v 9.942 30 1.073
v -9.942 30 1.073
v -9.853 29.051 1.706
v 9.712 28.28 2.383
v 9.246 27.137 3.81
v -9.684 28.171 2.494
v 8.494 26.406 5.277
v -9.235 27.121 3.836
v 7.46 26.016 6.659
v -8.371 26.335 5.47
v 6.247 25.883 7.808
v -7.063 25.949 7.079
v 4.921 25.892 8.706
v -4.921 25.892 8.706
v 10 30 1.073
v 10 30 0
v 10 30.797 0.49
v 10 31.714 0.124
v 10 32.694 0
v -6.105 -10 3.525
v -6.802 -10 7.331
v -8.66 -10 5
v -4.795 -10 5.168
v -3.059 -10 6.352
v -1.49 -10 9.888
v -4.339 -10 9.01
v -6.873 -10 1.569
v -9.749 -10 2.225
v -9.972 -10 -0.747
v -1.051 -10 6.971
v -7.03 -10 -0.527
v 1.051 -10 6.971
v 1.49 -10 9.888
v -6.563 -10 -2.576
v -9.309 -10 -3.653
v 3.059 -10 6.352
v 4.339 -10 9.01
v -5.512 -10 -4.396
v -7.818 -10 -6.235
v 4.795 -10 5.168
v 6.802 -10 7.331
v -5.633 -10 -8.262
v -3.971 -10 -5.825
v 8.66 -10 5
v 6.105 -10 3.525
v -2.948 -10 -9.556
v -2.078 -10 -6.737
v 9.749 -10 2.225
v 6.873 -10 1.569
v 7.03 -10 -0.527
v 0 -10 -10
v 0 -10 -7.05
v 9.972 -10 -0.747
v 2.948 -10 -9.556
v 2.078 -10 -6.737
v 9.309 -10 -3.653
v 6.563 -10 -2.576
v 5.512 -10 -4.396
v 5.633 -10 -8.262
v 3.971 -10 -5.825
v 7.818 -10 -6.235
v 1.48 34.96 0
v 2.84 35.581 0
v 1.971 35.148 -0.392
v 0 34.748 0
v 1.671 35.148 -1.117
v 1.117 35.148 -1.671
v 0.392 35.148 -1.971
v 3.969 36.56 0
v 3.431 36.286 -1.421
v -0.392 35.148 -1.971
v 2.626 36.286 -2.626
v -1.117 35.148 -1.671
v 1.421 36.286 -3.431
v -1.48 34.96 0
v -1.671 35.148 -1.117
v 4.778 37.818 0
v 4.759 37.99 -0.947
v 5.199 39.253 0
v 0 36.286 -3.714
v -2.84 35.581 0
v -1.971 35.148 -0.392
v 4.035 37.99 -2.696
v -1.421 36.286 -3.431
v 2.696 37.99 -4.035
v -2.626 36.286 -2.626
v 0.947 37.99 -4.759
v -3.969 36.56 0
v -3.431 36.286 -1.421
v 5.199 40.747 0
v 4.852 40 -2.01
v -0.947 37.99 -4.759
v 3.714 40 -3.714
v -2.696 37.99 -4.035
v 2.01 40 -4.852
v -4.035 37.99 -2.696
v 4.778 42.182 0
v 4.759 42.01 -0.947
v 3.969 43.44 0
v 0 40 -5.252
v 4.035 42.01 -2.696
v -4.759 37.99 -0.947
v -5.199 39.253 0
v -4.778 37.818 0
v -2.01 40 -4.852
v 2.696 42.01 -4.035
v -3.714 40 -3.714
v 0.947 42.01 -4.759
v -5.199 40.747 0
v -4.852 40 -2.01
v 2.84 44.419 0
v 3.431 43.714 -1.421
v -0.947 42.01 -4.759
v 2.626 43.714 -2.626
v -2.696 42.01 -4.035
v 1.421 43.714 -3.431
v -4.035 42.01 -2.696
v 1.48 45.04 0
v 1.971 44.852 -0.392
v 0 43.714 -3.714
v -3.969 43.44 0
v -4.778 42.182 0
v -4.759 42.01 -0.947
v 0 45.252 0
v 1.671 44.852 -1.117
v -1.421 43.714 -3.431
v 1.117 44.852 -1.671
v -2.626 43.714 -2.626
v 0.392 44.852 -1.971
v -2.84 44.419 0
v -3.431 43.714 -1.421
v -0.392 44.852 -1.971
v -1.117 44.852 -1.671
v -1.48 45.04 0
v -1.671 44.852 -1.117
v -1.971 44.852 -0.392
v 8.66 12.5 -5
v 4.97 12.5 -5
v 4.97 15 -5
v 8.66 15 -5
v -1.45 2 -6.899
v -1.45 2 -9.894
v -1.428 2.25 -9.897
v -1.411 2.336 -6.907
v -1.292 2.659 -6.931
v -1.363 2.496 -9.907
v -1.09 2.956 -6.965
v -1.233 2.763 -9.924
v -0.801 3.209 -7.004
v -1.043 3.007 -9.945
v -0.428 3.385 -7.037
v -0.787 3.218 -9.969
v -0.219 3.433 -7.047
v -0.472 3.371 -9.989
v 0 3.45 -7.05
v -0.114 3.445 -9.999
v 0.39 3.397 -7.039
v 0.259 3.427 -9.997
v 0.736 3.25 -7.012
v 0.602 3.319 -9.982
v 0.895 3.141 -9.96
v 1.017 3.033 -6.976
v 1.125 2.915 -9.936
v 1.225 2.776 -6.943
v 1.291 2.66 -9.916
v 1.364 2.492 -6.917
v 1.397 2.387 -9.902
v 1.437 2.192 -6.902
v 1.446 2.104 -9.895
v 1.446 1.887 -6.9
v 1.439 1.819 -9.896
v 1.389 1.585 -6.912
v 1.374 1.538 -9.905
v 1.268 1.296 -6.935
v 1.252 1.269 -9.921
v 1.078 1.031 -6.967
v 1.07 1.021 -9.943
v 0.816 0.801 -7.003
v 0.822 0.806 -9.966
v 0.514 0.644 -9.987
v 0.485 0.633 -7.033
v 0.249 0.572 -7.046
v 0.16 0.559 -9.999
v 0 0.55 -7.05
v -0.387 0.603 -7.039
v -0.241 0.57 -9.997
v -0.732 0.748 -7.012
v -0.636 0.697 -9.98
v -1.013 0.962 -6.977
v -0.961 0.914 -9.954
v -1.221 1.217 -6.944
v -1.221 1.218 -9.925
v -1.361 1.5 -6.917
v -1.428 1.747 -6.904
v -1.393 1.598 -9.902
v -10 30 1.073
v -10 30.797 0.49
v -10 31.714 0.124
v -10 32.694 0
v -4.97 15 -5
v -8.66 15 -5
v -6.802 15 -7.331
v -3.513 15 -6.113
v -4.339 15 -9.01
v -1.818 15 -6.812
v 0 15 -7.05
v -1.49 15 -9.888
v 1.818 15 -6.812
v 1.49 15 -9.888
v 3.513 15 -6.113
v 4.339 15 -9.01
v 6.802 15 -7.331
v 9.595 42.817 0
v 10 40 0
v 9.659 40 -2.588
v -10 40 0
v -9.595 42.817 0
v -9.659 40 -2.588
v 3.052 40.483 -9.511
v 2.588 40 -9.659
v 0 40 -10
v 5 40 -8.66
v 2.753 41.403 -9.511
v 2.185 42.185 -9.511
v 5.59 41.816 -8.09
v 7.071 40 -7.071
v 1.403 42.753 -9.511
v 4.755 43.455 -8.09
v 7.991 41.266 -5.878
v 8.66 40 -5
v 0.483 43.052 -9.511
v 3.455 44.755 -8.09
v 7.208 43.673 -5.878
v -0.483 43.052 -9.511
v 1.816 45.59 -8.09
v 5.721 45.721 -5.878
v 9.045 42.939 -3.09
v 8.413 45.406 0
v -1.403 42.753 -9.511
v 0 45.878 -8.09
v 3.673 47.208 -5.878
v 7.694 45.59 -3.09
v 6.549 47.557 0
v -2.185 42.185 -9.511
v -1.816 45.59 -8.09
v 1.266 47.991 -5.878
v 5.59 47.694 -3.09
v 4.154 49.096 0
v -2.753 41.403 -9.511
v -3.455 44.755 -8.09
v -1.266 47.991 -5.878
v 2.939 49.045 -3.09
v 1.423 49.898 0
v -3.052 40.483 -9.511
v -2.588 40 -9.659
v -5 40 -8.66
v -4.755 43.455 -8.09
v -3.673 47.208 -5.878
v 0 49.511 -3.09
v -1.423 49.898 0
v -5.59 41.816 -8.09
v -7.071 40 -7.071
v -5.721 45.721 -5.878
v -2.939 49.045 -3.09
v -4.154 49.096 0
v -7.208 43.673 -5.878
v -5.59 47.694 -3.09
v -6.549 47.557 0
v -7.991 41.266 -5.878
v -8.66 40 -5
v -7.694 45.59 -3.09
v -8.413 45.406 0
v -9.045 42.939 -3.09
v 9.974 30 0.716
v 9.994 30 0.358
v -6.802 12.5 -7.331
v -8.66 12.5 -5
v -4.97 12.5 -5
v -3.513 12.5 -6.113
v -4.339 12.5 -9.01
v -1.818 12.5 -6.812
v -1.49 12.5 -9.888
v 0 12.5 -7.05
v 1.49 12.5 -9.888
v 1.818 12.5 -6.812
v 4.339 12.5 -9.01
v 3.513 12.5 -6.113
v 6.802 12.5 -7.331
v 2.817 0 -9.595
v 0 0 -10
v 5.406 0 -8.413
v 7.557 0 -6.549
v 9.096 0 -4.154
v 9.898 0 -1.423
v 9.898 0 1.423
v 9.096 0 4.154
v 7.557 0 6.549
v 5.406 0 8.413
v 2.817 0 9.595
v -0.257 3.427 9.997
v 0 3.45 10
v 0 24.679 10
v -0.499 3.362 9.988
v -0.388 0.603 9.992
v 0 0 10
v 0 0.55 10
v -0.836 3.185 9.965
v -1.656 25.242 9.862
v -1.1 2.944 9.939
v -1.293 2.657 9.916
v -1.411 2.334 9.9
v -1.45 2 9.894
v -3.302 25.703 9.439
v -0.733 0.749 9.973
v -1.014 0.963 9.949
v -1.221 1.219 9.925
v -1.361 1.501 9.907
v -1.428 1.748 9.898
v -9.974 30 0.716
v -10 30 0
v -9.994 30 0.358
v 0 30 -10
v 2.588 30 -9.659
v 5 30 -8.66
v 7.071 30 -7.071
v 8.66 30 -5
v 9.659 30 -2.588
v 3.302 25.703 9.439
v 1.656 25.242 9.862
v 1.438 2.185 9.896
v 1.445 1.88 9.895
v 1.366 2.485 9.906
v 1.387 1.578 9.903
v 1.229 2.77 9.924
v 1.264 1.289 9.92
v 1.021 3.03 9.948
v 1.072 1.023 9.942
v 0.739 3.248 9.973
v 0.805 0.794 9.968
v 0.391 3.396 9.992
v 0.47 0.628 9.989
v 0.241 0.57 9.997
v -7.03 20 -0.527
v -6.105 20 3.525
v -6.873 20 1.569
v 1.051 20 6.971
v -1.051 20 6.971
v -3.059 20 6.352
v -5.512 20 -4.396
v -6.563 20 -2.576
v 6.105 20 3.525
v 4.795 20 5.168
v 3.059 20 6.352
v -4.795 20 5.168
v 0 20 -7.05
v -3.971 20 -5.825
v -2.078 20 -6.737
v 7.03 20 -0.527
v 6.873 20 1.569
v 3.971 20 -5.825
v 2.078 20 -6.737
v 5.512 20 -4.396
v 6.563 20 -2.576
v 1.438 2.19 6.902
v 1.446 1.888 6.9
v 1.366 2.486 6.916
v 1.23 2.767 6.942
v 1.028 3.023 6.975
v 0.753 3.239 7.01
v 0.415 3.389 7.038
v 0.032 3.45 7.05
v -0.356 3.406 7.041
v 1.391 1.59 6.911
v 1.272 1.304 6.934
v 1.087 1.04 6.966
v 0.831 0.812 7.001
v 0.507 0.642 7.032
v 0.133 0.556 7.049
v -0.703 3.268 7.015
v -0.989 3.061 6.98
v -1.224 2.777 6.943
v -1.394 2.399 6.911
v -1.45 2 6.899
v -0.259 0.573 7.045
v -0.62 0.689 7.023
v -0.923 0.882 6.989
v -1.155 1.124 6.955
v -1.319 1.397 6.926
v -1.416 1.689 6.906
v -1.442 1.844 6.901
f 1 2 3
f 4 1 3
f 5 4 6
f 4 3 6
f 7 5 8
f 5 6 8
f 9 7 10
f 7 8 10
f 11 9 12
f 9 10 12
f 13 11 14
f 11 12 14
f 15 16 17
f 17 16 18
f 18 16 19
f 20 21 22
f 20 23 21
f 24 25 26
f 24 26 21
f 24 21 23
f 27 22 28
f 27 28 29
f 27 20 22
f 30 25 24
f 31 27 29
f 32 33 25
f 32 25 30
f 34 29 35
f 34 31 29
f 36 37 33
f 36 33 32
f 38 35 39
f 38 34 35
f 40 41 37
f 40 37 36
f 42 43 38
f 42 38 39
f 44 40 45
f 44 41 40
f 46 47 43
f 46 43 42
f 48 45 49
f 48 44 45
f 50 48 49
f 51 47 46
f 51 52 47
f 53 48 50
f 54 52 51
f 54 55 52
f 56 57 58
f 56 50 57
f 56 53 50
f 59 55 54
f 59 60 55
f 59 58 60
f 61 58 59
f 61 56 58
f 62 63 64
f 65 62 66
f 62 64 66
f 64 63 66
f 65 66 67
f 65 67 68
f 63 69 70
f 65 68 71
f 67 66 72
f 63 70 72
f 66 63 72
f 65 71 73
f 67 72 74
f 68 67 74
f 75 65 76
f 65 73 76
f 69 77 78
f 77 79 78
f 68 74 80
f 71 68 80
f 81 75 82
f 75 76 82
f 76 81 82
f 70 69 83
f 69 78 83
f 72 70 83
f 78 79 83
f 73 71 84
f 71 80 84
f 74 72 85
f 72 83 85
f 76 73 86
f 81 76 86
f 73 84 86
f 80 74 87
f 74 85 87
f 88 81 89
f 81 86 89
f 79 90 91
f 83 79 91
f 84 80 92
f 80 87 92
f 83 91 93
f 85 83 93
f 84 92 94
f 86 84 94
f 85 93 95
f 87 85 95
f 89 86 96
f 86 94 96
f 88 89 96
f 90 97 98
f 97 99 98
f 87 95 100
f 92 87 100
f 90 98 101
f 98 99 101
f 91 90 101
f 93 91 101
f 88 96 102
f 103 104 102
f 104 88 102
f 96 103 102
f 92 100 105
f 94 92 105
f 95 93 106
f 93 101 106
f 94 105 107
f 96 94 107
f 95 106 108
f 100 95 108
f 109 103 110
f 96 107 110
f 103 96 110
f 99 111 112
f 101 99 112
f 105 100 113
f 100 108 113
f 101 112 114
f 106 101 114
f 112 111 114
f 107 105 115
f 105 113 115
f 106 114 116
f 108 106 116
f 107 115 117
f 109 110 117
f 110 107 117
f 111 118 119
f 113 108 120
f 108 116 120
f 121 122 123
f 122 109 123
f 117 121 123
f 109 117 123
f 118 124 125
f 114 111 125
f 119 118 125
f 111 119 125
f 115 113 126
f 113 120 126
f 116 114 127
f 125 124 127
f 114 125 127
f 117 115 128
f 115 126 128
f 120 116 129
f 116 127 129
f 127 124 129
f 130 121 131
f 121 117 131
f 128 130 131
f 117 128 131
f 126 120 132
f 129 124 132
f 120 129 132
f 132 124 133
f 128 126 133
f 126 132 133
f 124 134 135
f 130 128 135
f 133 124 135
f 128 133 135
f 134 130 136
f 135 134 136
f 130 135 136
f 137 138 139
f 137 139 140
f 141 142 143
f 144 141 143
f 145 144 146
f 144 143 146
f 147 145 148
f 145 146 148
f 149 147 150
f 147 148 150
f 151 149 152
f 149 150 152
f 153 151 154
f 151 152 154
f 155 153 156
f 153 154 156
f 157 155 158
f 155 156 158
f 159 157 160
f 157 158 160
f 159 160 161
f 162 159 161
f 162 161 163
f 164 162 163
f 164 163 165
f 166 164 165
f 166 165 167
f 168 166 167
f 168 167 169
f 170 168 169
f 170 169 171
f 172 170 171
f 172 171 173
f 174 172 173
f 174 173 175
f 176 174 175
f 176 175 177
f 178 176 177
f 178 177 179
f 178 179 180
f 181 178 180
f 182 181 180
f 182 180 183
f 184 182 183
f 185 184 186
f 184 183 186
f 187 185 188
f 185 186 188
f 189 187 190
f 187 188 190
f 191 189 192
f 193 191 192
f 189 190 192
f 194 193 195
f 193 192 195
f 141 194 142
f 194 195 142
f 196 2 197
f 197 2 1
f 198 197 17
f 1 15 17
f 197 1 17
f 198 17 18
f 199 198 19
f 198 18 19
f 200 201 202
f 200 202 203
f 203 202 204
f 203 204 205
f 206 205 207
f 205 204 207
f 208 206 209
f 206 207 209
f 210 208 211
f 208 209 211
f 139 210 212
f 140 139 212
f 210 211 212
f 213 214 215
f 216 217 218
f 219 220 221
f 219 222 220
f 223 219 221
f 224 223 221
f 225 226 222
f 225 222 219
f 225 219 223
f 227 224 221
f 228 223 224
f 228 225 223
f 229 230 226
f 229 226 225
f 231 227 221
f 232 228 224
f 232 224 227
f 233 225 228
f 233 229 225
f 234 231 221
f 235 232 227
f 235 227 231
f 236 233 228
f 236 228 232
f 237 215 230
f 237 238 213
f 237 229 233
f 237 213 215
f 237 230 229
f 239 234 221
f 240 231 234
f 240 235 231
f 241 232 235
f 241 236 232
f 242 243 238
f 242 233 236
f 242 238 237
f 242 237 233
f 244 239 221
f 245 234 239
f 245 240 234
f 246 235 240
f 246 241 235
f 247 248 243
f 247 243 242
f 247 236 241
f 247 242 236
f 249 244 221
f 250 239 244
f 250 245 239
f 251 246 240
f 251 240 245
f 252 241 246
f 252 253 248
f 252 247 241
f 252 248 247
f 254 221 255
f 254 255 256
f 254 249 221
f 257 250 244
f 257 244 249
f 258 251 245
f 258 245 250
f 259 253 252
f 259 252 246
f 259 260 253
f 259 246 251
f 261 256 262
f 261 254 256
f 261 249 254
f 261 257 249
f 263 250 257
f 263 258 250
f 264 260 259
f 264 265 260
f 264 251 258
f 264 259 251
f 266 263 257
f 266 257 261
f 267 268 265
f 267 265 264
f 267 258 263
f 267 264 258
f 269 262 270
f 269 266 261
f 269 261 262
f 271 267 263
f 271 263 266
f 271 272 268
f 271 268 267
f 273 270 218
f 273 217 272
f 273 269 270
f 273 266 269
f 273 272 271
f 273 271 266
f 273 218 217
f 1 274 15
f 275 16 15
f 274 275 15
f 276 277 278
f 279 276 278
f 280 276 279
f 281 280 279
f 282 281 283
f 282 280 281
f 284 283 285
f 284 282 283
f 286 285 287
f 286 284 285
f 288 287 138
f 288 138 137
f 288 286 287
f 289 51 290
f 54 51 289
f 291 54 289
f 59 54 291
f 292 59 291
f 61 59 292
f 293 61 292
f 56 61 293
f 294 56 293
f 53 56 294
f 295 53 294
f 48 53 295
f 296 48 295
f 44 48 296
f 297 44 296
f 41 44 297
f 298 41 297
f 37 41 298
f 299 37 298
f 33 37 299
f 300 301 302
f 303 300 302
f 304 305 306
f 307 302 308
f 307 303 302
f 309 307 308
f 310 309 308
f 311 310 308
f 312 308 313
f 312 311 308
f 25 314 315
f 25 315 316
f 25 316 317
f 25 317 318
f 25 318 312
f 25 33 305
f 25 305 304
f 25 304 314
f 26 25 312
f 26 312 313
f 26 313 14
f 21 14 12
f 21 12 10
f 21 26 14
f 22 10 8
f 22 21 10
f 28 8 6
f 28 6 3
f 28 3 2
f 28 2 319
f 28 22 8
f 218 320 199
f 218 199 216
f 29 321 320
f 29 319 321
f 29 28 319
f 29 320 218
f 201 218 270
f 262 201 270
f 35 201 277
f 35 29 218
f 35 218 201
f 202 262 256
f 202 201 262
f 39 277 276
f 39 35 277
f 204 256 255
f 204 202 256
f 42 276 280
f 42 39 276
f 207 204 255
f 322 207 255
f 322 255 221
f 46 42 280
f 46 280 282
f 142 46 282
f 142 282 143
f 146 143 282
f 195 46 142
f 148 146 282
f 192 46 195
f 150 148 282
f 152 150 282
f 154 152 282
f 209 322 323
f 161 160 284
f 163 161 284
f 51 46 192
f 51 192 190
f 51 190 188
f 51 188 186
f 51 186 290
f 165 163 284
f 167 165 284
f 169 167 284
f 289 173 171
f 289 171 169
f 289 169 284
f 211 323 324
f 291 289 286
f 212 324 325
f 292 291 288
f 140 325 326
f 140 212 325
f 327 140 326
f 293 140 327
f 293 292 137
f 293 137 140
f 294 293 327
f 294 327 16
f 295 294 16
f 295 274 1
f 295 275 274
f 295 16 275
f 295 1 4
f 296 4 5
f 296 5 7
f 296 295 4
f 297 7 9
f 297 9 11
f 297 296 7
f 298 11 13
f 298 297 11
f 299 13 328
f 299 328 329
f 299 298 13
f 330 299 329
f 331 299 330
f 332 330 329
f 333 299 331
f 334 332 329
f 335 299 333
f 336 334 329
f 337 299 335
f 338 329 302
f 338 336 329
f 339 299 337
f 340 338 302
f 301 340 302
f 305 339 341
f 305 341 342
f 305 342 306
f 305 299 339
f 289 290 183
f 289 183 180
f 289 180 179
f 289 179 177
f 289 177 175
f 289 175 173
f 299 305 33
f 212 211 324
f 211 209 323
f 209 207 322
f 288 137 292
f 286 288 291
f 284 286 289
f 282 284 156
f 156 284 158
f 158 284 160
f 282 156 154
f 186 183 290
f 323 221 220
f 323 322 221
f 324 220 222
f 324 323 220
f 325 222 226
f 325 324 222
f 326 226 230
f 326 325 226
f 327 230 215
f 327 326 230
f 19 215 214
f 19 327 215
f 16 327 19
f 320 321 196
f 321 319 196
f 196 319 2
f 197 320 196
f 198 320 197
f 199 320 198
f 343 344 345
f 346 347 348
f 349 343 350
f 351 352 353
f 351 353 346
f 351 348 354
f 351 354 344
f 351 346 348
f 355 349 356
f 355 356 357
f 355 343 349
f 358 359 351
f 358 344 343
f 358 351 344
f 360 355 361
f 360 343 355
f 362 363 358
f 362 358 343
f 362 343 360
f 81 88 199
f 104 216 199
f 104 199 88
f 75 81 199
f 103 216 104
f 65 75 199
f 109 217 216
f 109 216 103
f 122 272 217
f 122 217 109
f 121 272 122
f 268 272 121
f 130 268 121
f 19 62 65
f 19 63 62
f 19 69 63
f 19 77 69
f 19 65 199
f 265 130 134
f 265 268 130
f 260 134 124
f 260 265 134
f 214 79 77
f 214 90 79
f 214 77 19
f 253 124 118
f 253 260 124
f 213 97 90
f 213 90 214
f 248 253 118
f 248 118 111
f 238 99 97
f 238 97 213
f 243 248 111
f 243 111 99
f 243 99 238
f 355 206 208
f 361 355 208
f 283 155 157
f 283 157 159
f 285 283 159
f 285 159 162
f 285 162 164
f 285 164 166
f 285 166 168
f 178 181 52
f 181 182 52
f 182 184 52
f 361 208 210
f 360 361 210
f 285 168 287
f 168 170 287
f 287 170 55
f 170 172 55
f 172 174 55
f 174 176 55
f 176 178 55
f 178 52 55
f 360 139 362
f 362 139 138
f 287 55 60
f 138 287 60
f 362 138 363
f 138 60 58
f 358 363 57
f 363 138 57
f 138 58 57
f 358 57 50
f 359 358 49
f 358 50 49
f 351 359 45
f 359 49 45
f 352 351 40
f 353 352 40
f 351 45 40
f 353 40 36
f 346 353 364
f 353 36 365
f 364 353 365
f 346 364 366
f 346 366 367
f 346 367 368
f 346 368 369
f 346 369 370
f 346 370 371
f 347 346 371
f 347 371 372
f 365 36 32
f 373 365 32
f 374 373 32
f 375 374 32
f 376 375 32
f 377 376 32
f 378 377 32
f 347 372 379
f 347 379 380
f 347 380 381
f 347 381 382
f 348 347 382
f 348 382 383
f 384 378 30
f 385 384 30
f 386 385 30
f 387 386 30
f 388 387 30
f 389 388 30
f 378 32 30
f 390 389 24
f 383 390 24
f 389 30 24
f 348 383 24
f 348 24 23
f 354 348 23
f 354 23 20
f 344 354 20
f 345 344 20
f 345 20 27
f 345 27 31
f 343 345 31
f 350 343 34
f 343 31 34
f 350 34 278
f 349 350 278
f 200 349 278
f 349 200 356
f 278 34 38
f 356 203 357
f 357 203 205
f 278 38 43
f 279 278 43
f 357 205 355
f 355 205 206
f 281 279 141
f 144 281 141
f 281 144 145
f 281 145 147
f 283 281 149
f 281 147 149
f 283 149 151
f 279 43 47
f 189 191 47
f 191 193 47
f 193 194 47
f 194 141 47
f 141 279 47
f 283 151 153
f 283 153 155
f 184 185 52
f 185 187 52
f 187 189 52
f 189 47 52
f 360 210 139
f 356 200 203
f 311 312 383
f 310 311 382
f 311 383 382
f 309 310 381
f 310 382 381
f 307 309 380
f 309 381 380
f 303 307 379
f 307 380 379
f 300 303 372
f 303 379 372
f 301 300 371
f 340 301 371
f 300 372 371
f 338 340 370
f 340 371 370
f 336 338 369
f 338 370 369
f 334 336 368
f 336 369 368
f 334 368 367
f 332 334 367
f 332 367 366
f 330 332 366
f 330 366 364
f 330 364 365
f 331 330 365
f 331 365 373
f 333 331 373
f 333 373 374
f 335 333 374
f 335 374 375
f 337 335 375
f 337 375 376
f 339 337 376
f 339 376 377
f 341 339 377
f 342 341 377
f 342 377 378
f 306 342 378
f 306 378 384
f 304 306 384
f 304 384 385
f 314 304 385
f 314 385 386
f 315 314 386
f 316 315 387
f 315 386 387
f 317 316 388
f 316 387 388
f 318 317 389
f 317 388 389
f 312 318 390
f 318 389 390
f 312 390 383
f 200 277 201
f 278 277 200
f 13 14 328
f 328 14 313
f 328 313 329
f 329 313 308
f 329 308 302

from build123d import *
from build123d.topology import SkipClean

# Parameters (mm, degrees)
SKETCH_1_R               = 10
EXTRUDE_1_DEPTH          = 30
SKETCH_2_R               = 7.05
CUT_EXTRUDE_1_DEPTH      = 20
REVOLVE_10_ANGLE         = 180
CUT_EXTRUDE_2_DEPTH      = 52.961524228
CUT_EXTRUDE_2_DEPTH_BACK = 52.961524228
EXTRUDE_2_DEPTH          = 10
CUT_EXTRUDE_START        = -2.5
CUT_EXTRUDE_3_DEPTH      = 2.5
EXTRUDE_START            = 10
SKETCH_11_R              = 10
SKETCH_11_R_2            = 7.05
EXTRUDE_3_DEPTH          = 10
HOLE_WIZARD_M2_5_1_D     = 2.9


# Read off the part's stored shape, not the designer's step: 회전1
with BuildPart() as part:
    # 스케치1 → 보스-돌출1 (new body)
    with BuildSketch(Plane(origin=(0, 0, 0), x_dir=(1, 0, 0), z_dir=(0, 1, 0))):
        with Locations(Location((0, 0, 0), (0, 0, 270))):
            Circle(SKETCH_1_R)
    extrude(amount=EXTRUDE_1_DEPTH)

    # 스케치2 → 컷-돌출1 (cut)
    with BuildSketch(Plane.XZ):
        with Locations(Location((0, 0, 0), (0, 0, 270))):
            Circle(SKETCH_2_R)
    extrude(amount=-CUT_EXTRUDE_1_DEPTH, mode=Mode.SUBTRACT)



with BuildPart() as body_2:
    # 회전1 outline → 회전1 (revolve)
    with BuildSketch(Plane.XZ.offset(-40)):
        with BuildLine():
            Line((0, 1e-08), (0, -10))
            ThreePointArc((0, -10), (7.071067815, -7.071067808), (10, 1e-08))
            Line((10, 1e-08), (0, 1e-08))
        make_face()
    revolve(axis=Axis((0, 40, 0), (0, 0, 1)))

    # 스케치5 → 컷-회전3 (revolve, cut)
    with BuildSketch(Plane.XY):
        with BuildLine():
            Line((0, 45.252296995), (0, 34.747703005))
            ThreePointArc((0, 34.747703005), (5.252296995, 40), (0, 45.252296995))
        make_face()
    revolve(axis=Axis((0, 0, 0), (0, 1, 0)), mode=Mode.SUBTRACT)


with BuildPart() as part_1:
    with SkipClean():  # the faces are left unmerged after this step: merging them gives an invalid solid
        add(part.part)

        add(body_2.part)  # 회전10 merges body 2
        # 스케치6 → 회전10 (revolve, symmetric)
        with BuildSketch(Plane(origin=(0, 0, 0), x_dir=(0, 0, -1), z_dir=(1, 0, 0))) as revolve_10_sk:
            with BuildLine():
                Line((0, 30), (0, 30.711529751))
                ThreePointArc((0, 30.711529751), (5.980054101, 33.531969517), (7.351370698, 40))
                Line((7.351370698, 40), (10, 40))
                Line((10, 40), (10, 30))
                Line((10, 30), (0, 30))
            make_face()
        revolve(axis=Axis((0, 0, 0), (0, 1, 0)), revolution_arc=REVOLVE_10_ANGLE / 2)
        revolve(revolve_10_sk.sketch, axis=Axis((0, 0, 0), (0, -1, 0)), revolution_arc=REVOLVE_10_ANGLE / 2)
    add(part_1.part.scale(1), mode=Mode.REPLACE)  # the faces are merged on a copy

    # 스케치7 → 컷-돌출2 (cut, two sides: drawn at the far end of the back side and taken through both)
    with BuildSketch(Plane(origin=(0, 0, 0), x_dir=(0, 0, -1), z_dir=(1, 0, 0)).offset(-CUT_EXTRUDE_2_DEPTH_BACK)):
        with BuildLine():
            Line((-10, 24.679295292), (-17.050906842, 49.125599249))
            Line((-17.050906842, 49.125599249), (0, 49.125599249))
            Line((0, 49.125599249), (0, 34.049122638))
            ThreePointArc((0, 34.049122638), (-2.58520571, 28.084119755), (-8.705629602, 25.892098007))
            ThreePointArc((-8.705629602, 25.892098007), (-9.615626451, 25.566183836), (-10, 24.679295292))
        make_face()
    extrude(amount=CUT_EXTRUDE_2_DEPTH + CUT_EXTRUDE_2_DEPTH_BACK, mode=Mode.SUBTRACT)

    # 스케치8 → 보스-돌출2 (add, symmetric)
    with BuildSketch(Plane(origin=(0, 0, 0), x_dir=(0, 0, -1), z_dir=(1, 0, 0))):
        with BuildLine():
            Line((0, 32.693889078), (0, 30))
            Line((0, 30), (-1.073327621, 30))
            ThreePointArc((-1.073327621, 30), (-0.278211386, 31.243969205), (0, 32.693889078))
        make_face()
    extrude(amount=EXTRUDE_2_DEPTH, both=True)

    # 스케치10 → 컷-돌출3 (cut)
    with BuildSketch(Plane(origin=(0, 15, 0), x_dir=(1, 0, 0), z_dir=(0, 1, 0)).offset(CUT_EXTRUDE_START)):
        with BuildLine():
            Line((-8.660254038, 5), (-3.31662479, 5))
            ThreePointArc((-3.31662479, 5), (0, 6), (3.31662479, 5))
            Line((3.31662479, 5), (8.660254038, 5))
            ThreePointArc((8.660254038, 5), (0, 10), (-8.660254038, 5))
        make_face()
    extrude(amount=CUT_EXTRUDE_3_DEPTH, mode=Mode.SUBTRACT)

    # 스케치11 → 보스-돌출3 (add)
    with BuildSketch(Plane.XZ.offset(EXTRUDE_START)):
        with Locations(Location((0, 0, 0), (0, 0, 270))):
            Circle(SKETCH_11_R)
        with Locations(Location((0, 0, 0), (0, 0, 270))):
            Circle(SKETCH_11_R_2, mode=Mode.SUBTRACT)
    extrude(amount=-EXTRUDE_3_DEPTH)

    # M2.5 여유 구멍1 (through all)
    with Locations(Plane.XY.offset(10)):
        with Locations((0, 2)):
            Hole(HOLE_WIZARD_M2_5_1_D / 2)


solid = part_1.part
